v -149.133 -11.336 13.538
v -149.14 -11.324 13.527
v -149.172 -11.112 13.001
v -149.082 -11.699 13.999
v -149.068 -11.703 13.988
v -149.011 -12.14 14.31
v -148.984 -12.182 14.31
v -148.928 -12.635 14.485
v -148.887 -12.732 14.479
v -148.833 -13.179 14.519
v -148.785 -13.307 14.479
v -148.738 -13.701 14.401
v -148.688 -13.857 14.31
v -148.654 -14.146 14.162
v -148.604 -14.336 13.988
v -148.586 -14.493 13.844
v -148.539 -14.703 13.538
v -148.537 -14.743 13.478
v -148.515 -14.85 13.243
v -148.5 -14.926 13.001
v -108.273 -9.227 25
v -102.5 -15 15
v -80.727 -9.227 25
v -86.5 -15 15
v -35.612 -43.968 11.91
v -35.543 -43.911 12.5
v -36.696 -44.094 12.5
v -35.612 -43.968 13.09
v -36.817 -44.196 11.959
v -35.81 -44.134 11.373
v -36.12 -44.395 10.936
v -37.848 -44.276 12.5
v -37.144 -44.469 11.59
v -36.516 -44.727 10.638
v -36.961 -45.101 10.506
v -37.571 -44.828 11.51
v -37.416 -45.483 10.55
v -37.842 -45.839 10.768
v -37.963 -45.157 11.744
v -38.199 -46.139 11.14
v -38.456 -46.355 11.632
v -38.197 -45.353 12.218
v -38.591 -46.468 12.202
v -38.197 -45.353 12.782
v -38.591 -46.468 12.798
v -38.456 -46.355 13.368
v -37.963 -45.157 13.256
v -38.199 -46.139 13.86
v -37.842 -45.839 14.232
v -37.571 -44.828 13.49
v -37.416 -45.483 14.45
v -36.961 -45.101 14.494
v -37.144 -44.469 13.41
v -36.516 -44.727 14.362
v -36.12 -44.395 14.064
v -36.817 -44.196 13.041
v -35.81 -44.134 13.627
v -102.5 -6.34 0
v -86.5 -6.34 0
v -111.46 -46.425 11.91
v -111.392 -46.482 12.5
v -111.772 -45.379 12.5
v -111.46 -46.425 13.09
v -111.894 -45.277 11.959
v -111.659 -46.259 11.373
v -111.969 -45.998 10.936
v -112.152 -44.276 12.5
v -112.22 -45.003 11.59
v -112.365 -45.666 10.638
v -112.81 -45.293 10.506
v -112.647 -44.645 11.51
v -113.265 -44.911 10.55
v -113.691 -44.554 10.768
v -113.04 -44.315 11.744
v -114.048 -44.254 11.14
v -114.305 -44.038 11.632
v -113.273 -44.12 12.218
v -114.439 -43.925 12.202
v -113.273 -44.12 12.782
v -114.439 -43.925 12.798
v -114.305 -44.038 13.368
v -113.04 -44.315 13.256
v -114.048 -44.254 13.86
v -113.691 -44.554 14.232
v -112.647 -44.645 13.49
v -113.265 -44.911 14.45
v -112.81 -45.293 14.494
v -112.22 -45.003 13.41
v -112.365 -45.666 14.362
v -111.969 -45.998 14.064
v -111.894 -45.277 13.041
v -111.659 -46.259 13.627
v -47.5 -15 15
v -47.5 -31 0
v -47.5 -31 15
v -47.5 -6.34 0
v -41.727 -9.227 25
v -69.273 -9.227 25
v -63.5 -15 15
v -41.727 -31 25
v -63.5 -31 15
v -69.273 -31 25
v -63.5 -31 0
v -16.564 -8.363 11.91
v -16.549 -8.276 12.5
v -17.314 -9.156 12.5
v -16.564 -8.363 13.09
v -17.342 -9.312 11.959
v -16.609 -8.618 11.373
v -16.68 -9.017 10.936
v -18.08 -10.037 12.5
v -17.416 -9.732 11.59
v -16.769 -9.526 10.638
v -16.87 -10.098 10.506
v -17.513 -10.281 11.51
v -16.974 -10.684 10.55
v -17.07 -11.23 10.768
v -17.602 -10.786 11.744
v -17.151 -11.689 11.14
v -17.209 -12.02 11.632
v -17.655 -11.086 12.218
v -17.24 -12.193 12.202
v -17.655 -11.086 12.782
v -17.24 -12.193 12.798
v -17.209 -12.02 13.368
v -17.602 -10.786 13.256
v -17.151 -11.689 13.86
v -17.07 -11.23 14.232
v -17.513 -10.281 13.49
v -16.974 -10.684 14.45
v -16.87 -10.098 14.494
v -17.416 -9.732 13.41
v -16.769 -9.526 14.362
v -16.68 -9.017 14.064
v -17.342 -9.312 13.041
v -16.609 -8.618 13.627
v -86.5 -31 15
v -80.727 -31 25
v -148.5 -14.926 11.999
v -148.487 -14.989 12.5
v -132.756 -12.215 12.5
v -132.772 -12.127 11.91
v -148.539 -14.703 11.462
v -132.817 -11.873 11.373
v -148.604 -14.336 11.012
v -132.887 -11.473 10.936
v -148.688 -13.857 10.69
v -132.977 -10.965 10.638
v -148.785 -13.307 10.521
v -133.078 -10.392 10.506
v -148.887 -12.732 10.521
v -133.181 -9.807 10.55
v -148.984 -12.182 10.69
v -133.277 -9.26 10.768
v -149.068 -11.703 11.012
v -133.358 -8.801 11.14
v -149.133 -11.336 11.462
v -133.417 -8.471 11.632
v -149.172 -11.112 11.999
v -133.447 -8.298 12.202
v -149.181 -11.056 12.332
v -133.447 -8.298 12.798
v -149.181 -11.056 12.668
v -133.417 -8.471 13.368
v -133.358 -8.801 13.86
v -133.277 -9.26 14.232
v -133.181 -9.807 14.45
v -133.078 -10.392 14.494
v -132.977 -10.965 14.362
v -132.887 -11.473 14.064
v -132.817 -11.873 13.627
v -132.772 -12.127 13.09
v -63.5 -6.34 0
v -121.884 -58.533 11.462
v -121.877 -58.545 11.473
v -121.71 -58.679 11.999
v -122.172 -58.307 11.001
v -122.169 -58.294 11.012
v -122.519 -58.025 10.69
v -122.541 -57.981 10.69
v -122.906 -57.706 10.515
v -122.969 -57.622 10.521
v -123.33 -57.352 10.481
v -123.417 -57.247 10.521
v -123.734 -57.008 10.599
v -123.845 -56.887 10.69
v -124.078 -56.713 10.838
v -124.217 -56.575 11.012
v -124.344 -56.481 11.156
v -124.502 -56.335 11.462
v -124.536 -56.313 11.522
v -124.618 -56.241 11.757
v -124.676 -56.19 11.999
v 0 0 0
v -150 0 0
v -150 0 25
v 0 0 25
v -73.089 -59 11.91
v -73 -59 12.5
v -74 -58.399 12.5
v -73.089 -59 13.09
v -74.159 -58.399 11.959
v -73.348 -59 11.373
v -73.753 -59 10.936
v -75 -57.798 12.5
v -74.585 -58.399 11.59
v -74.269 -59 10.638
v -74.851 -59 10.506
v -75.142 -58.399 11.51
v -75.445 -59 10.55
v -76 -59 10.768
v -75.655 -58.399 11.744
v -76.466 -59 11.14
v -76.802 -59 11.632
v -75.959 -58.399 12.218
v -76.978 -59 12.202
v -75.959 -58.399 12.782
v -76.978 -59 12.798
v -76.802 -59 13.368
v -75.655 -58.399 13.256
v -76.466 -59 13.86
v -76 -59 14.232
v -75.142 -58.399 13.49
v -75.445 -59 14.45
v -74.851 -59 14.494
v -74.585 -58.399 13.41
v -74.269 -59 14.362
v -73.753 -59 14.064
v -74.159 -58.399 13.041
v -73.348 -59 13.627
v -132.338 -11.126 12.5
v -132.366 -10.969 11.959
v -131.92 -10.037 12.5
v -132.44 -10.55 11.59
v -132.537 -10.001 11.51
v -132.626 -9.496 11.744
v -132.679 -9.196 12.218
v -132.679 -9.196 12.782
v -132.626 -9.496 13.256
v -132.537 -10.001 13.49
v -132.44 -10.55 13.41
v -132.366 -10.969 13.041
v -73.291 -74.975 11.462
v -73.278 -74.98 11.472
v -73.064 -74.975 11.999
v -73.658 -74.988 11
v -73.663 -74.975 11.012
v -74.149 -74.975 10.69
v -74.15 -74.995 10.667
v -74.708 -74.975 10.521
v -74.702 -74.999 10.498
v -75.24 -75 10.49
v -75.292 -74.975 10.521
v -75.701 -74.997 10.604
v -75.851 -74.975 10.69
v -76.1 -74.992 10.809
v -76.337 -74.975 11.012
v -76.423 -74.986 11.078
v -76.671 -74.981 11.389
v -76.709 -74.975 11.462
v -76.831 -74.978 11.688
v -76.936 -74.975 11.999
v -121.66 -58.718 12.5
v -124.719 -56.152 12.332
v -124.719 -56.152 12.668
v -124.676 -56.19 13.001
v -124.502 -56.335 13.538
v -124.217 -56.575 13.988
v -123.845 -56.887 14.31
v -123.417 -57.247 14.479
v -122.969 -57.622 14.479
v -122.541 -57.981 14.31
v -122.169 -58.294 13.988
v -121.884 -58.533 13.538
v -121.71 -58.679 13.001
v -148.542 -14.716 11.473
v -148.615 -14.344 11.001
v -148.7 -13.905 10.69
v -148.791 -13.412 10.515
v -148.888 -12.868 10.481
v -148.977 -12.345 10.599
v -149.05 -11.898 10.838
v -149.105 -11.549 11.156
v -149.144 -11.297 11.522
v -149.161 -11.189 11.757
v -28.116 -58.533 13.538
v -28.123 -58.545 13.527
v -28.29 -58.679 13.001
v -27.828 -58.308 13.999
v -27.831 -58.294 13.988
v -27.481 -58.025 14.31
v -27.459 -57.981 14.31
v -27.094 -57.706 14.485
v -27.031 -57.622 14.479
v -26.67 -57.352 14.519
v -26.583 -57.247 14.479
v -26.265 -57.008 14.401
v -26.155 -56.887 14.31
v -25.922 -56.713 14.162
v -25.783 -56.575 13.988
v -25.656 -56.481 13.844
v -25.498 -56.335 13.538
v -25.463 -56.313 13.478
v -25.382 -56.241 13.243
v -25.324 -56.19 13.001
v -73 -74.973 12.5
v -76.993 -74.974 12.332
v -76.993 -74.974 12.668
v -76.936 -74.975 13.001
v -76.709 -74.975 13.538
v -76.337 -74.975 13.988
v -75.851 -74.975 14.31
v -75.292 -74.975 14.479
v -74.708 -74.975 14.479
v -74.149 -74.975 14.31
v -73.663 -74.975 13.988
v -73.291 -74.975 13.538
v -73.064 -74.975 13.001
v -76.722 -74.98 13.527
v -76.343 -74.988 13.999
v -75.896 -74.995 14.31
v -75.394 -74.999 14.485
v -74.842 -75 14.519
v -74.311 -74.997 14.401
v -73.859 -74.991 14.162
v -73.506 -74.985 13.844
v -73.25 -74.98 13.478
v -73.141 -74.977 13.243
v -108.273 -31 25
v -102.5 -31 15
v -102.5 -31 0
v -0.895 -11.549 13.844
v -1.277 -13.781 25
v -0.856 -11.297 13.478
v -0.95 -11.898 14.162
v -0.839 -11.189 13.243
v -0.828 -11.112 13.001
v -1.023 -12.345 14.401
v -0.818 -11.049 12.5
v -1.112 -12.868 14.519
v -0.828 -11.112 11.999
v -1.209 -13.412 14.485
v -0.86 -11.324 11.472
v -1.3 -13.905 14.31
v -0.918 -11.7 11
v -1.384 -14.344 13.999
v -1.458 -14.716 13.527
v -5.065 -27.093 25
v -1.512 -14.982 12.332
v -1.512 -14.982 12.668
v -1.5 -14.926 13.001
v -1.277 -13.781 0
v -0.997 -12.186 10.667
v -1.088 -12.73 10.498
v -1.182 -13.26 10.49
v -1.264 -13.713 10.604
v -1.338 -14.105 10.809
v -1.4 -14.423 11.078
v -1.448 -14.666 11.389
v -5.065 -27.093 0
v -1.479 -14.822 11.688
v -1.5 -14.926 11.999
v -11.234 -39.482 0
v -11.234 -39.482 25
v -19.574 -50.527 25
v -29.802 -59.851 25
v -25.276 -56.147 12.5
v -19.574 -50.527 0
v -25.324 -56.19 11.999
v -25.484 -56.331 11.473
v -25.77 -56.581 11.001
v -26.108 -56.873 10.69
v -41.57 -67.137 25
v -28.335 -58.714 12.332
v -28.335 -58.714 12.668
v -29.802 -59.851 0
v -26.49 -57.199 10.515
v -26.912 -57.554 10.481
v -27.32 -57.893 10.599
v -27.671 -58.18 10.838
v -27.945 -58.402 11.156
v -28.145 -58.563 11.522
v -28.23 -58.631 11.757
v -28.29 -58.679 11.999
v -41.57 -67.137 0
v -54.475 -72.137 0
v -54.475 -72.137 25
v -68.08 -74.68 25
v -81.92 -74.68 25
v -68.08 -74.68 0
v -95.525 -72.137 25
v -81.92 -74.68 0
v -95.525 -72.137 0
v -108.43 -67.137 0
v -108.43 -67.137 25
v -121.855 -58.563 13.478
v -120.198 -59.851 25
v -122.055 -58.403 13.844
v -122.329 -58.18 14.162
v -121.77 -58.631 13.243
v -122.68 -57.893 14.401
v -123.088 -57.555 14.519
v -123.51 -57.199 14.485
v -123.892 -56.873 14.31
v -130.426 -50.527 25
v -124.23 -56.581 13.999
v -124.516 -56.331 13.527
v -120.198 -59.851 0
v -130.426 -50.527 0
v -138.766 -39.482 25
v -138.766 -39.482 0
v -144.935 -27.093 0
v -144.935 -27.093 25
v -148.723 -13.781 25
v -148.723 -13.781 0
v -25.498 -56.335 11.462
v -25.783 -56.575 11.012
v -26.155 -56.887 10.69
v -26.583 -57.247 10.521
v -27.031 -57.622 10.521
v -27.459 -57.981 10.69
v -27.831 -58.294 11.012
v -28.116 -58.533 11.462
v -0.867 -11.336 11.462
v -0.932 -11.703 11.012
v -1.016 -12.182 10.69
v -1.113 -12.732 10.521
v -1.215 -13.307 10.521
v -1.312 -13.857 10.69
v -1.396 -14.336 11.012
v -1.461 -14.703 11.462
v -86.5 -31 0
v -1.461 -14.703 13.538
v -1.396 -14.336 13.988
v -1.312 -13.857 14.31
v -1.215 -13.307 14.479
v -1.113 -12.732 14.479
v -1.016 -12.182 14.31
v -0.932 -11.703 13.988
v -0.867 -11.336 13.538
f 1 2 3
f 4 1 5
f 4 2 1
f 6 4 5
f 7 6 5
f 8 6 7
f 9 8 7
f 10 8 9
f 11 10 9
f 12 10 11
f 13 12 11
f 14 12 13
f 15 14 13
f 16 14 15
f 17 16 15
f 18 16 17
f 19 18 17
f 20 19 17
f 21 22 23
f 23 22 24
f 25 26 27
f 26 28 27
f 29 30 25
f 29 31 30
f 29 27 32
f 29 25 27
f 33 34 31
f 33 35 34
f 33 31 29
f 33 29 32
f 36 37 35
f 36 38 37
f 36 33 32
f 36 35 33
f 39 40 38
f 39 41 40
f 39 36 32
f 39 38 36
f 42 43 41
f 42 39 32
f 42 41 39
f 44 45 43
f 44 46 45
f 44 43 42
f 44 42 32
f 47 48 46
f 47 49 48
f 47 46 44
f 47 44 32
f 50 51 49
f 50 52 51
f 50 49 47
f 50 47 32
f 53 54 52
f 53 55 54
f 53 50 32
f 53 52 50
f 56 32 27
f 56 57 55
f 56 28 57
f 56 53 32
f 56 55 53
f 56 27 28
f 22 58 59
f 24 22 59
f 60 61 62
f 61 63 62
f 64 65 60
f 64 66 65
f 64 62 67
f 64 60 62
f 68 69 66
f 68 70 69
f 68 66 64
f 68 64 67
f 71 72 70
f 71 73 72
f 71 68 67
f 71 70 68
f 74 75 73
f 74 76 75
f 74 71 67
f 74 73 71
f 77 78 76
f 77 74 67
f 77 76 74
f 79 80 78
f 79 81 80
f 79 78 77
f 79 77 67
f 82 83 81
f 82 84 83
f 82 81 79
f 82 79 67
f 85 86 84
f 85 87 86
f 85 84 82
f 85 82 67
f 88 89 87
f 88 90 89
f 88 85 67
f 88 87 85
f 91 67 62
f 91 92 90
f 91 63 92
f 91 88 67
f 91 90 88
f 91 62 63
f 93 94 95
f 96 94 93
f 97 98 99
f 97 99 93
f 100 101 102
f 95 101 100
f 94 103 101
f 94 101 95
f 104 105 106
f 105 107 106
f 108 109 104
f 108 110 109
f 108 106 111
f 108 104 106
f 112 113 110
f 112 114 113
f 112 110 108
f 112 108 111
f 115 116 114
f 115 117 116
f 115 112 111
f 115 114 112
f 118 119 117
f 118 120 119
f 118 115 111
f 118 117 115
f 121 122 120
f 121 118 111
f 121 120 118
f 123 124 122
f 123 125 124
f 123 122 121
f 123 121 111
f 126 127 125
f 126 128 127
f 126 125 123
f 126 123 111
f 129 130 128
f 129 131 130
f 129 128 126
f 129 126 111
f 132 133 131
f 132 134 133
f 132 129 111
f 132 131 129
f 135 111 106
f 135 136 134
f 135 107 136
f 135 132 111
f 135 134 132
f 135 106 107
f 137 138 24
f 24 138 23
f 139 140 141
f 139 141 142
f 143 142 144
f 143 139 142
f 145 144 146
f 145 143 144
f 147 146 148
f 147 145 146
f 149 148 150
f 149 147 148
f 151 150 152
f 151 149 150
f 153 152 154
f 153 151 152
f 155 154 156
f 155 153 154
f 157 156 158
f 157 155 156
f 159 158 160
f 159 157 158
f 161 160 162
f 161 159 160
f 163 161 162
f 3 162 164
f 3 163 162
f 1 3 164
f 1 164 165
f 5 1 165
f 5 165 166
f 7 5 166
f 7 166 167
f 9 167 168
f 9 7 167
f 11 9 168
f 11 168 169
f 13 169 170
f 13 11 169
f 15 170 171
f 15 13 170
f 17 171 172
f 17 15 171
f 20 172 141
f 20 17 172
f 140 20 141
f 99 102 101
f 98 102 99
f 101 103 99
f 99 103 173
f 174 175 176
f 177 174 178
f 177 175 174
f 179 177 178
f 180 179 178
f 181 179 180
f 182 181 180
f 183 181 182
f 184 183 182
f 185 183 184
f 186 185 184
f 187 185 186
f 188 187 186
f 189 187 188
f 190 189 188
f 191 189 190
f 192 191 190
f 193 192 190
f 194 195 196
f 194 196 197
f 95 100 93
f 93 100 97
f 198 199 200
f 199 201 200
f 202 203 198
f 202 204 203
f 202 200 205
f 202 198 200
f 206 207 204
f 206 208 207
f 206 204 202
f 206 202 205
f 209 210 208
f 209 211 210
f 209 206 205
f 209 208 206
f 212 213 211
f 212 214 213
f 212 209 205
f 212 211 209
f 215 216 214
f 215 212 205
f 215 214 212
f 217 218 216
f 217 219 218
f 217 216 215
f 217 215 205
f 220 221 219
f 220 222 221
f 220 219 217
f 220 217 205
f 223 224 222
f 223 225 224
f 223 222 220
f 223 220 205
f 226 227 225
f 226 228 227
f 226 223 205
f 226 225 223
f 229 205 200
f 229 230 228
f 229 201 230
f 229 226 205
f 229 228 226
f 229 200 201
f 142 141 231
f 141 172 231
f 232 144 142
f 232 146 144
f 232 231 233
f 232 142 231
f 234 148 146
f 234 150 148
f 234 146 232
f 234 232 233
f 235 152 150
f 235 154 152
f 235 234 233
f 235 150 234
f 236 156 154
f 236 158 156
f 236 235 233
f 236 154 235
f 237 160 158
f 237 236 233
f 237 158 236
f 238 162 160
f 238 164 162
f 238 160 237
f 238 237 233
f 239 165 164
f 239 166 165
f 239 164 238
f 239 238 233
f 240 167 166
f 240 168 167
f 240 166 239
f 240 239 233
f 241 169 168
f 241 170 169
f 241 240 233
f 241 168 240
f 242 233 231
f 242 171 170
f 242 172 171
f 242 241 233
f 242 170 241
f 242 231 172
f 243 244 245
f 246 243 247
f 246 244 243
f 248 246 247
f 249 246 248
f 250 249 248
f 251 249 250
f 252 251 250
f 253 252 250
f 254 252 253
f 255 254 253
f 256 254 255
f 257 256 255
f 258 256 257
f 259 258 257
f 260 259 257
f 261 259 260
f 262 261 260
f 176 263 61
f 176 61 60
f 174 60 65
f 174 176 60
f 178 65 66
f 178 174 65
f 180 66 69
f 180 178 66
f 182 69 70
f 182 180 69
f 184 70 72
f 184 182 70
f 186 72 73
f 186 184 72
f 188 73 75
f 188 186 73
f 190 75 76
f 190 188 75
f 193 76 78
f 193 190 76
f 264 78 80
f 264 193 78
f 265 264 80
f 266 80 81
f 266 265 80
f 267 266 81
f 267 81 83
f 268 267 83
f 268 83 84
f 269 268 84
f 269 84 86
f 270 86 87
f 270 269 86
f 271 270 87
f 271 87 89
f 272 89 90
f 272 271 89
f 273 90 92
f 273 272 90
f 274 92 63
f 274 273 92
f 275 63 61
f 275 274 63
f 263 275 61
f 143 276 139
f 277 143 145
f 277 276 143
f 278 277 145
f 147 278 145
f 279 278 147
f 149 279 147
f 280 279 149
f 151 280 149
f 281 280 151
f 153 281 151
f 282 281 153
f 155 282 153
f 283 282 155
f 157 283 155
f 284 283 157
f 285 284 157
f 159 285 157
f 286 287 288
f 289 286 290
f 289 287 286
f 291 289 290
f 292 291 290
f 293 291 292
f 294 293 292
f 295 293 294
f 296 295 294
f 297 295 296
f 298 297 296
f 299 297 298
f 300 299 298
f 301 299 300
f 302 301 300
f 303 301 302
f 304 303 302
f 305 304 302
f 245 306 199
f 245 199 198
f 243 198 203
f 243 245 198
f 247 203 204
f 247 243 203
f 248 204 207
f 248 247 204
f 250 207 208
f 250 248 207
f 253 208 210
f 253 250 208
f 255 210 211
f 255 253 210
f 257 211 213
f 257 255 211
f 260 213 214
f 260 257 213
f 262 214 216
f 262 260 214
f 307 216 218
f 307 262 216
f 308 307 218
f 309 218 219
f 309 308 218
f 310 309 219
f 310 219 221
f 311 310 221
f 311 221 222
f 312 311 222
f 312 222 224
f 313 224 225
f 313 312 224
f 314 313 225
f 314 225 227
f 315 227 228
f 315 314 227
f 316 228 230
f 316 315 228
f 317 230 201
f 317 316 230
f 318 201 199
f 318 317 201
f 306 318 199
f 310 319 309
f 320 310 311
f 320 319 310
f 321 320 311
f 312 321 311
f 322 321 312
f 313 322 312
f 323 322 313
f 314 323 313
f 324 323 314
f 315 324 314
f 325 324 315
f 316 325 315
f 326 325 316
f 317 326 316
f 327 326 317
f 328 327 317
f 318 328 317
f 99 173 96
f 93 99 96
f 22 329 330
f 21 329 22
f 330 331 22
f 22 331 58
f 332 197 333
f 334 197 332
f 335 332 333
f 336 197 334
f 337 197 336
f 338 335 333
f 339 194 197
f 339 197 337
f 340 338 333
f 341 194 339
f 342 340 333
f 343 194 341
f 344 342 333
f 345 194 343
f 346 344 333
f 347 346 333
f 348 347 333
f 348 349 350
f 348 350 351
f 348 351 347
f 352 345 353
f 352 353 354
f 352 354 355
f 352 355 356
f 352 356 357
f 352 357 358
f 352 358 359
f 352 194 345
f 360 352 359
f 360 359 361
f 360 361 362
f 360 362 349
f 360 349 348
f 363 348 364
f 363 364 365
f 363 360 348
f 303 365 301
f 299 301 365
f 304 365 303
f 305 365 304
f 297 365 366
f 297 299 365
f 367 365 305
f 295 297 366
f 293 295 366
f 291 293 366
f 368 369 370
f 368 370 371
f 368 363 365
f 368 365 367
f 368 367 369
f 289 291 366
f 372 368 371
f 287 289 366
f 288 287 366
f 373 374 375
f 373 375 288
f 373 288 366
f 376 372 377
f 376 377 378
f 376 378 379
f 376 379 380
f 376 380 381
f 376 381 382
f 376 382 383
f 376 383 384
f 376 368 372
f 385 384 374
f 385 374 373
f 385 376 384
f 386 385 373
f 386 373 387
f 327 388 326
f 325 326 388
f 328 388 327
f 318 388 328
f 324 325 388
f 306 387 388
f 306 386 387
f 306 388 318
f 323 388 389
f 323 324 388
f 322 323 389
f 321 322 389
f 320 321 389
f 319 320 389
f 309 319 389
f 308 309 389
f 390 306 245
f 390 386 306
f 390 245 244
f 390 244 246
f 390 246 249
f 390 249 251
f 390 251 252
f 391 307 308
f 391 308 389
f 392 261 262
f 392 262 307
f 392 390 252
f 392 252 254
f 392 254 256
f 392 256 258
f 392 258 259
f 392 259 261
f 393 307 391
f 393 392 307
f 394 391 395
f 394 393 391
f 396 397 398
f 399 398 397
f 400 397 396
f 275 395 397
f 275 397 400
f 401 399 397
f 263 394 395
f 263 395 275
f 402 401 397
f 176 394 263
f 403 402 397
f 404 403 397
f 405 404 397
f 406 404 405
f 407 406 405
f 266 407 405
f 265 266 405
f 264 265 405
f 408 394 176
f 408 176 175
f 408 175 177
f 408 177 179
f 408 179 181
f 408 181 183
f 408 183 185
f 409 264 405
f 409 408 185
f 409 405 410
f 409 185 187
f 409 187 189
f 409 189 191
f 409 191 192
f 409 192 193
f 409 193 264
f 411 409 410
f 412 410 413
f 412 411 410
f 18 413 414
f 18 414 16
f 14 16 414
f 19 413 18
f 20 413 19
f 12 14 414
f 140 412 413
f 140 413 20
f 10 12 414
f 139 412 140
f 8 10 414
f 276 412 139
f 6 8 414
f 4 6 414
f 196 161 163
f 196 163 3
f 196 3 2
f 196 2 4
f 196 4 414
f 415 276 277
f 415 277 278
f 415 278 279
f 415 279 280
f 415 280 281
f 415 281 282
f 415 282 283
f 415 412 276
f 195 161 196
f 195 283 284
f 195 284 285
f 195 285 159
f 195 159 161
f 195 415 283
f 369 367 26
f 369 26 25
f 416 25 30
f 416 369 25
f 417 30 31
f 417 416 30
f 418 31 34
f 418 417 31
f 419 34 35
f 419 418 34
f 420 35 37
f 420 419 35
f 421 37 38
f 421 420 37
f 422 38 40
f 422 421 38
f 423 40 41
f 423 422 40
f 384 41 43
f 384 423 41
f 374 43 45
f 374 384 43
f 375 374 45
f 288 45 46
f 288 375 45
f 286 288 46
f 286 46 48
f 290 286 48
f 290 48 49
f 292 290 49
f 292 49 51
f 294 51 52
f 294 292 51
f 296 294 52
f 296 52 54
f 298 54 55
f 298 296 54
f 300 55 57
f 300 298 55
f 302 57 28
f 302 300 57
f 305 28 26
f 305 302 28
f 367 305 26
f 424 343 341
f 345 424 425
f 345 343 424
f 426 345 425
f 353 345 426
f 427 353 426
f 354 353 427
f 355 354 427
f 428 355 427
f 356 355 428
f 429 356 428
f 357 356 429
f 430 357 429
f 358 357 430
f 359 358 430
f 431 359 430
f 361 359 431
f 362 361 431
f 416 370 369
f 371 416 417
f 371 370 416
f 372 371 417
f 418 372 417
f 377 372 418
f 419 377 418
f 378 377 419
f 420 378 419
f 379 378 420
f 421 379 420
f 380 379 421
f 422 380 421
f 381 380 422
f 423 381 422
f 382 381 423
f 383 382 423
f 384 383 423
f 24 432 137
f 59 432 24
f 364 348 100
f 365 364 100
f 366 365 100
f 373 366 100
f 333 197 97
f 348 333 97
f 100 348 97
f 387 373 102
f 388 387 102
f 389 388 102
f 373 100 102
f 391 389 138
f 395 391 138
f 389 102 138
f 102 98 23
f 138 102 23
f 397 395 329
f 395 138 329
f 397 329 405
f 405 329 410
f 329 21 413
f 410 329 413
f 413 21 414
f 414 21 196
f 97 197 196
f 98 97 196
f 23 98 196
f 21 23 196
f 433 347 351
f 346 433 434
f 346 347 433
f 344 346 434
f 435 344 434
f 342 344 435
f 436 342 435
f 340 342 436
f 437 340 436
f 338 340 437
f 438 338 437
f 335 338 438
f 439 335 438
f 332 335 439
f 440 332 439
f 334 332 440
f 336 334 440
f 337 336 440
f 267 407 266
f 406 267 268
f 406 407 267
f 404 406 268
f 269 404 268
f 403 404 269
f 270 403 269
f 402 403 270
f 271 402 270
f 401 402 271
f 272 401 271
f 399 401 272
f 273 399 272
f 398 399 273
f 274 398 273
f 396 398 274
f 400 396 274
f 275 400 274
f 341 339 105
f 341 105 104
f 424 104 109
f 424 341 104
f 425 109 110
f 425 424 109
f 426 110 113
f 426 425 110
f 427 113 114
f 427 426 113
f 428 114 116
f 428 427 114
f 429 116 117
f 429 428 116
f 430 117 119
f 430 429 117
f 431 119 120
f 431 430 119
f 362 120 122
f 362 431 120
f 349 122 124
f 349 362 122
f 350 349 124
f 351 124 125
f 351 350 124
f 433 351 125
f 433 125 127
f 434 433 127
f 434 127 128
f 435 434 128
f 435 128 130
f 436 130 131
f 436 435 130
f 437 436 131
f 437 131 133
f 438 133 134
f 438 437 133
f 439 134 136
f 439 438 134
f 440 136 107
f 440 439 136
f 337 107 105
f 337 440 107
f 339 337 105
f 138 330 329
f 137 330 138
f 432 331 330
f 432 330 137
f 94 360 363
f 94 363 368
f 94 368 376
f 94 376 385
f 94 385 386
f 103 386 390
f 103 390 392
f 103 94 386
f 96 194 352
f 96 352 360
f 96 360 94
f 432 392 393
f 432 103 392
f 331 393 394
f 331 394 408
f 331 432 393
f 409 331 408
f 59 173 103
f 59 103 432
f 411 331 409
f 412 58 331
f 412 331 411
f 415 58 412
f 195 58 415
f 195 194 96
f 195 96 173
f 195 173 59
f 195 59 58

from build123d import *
from OCP.BRepFilletAPI import BRepFilletAPI_MakeChamfer

# Parameters (mm, degrees)
SKETCH1_W           = 16
SKETCH1_H           = 16
BOSS_EXTRUDE1_DEPTH = 25
CIRPATTERN1_COUNT   = 5
CIRPATTERN1_ANGLE   = 160
CHAMFER1_SIZE       = 15
CHAMFER1_SIZE2      = 8.660254038
CHAMFER3_SIZE       = 10
CHAMFER3_SIZE_2     = 5.773502692


with BuildPart() as part:
    # Sketch1 → Boss-Extrude1 (new body)
    with BuildSketch(Plane.XY):
        with BuildLine():
            Line((-150, 0), (0, 0))
            ThreePointArc((0, 0), (-75, -75), (-150, 0))
        make_face()
        with Locations((-55.5, -23)):
            Rectangle(SKETCH1_W, SKETCH1_H, mode=Mode.SUBTRACT)
        with Locations((-94.5, -23)):
            Rectangle(SKETCH1_W, SKETCH1_H, mode=Mode.SUBTRACT)
    extrude(amount=BOSS_EXTRUDE1_DEPTH)

    # Sketch4 → Ø4.0mm Dowel Hole2 (revolve, cut)
    with BuildSketch(Plane(origin=(-1.139418524, -13.023613325, 12.5), x_dir=(0.17364817766693047, 0.9848077530122081, 0), z_dir=(0, 0, 1))):
        Polygon((0, 0), (0, 17.201721238), (2, 16), (2, 0.025), (2.025, 0), align=None)
    f_4_0mm_dowel_hole2 = revolve(axis=Axis((5.114110708, -14.126279253, 12.5), (-0.9848077530122081, 0.17364817766693044, 0)), mode=Mode.SUBTRACT)

    # CirPattern1: Ø4.0mm Dowel Hole2 ×5 about axis
    cirpattern1_axis = Axis((-75, 0, 0), (0, 0, -1))
    for i in range(1, CIRPATTERN1_COUNT):
        add(f_4_0mm_dowel_hole2.rotate(cirpattern1_axis, i * CIRPATTERN1_ANGLE / (CIRPATTERN1_COUNT - 1)), mode=Mode.SUBTRACT)

    # Chamfer1: one chamfer whose edges measure the first distance from different faces: ONE call of the kernel's chamfer builder (chamfer() names one face for all edges)
    chamfer1_edges_1 = [part.edges().sort_by_distance(p)[0] for p in [
        (-55.5, -15, 0),
    ]]
    chamfer1_side_1 = [part.faces().sort_by_distance(p)[0] for p in [
        (-55.5, -15, 12.5),
    ]]
    chamfer1_edges_2 = [part.edges().sort_by_distance(p)[0] for p in [
        (-94.5, -15, 0),
    ]]
    chamfer1_side_2 = [part.faces().sort_by_distance(p)[0] for p in [
        (-94.5, -15, 12.5),
    ]]
    chamfer1 = BRepFilletAPI_MakeChamfer(part.part.solid().wrapped)
    for e in chamfer1_edges_1:
        chamfer1.Add(CHAMFER1_SIZE, CHAMFER1_SIZE2, e.wrapped, chamfer1_side_1[0].wrapped)  # the first distance lies on this face
    for e in chamfer1_edges_2:
        chamfer1.Add(CHAMFER1_SIZE, CHAMFER1_SIZE2, e.wrapped, chamfer1_side_2[0].wrapped)  # the first distance lies on this face
    add(Compound.cast(chamfer1.Shape()), mode=Mode.REPLACE)

    # Chamfer3
    chamfer3_edges_1 = [part.edges().sort_by_distance(p)[0] for p in [
        (-102.5, -23, 25),
    ]]
    chamfer3_side_1 = [part.faces().sort_by_distance(p)[0] for p in [
        (-102.5, -23, 24.884529946),
    ]]
    chamfer3_edges_2 = [part.edges().sort_by_distance(p)[0] for p in [
        (-94.5, -15, 25),
    ]]
    chamfer3_side_2 = [part.faces().sort_by_distance(p)[0] for p in [
        (-94.5, -14.884529946, 25),
    ]]
    chamfer3_edges_3 = [part.edges().sort_by_distance(p)[0] for p in [
        (-86.5, -23, 25),
    ]]
    chamfer3_side_3 = [part.faces().sort_by_distance(p)[0] for p in [
        (-86.5, -23, 24.884529946),
    ]]
    chamfer3_edges_4 = [part.edges().sort_by_distance(p)[0] for p in [
        (-47.5, -23, 25),
    ]]
    chamfer3_side_4 = [part.faces().sort_by_distance(p)[0] for p in [
        (-47.5, -23, 24.884529946),
    ]]
    chamfer3_edges_5 = [part.edges().sort_by_distance(p)[0] for p in [
        (-55.5, -15, 25),
    ]]
    chamfer3_side_5 = [part.faces().sort_by_distance(p)[0] for p in [
        (-55.5, -15, 24.884529946),
    ]]
    chamfer3_edges_6 = [part.edges().sort_by_distance(p)[0] for p in [
        (-63.5, -23, 25),
    ]]
    chamfer3_side_6 = [part.faces().sort_by_distance(p)[0] for p in [
        (-63.5, -23, 24.884529946),
    ]]
    chamfer3 = BRepFilletAPI_MakeChamfer(part.part.solid().wrapped)
    for e in chamfer3_edges_1:
        chamfer3.Add(CHAMFER3_SIZE - 0.0001, CHAMFER3_SIZE_2 - 0.0001, e.wrapped, chamfer3_side_1[0].wrapped)
    for e in chamfer3_edges_2:
        chamfer3.Add(CHAMFER3_SIZE_2 - 0.0001, CHAMFER3_SIZE - 0.0001, e.wrapped, chamfer3_side_2[0].wrapped)
    for e in chamfer3_edges_3:
        chamfer3.Add(CHAMFER3_SIZE - 0.0001, CHAMFER3_SIZE_2 - 0.0001, e.wrapped, chamfer3_side_3[0].wrapped)
    for e in chamfer3_edges_4:
        chamfer3.Add(CHAMFER3_SIZE - 0.0001, CHAMFER3_SIZE_2 - 0.0001, e.wrapped, chamfer3_side_4[0].wrapped)
    for e in chamfer3_edges_5:
        chamfer3.Add(CHAMFER3_SIZE - 0.0001, CHAMFER3_SIZE_2 - 0.0001, e.wrapped, chamfer3_side_5[0].wrapped)
    for e in chamfer3_edges_6:
        chamfer3.Add(CHAMFER3_SIZE - 0.0001, CHAMFER3_SIZE_2 - 0.0001, e.wrapped, chamfer3_side_6[0].wrapped)
    add(Compound.cast(chamfer3.Shape()), mode=Mode.REPLACE)  # a hair under: the kernel refuses the full size


solid = part.part
